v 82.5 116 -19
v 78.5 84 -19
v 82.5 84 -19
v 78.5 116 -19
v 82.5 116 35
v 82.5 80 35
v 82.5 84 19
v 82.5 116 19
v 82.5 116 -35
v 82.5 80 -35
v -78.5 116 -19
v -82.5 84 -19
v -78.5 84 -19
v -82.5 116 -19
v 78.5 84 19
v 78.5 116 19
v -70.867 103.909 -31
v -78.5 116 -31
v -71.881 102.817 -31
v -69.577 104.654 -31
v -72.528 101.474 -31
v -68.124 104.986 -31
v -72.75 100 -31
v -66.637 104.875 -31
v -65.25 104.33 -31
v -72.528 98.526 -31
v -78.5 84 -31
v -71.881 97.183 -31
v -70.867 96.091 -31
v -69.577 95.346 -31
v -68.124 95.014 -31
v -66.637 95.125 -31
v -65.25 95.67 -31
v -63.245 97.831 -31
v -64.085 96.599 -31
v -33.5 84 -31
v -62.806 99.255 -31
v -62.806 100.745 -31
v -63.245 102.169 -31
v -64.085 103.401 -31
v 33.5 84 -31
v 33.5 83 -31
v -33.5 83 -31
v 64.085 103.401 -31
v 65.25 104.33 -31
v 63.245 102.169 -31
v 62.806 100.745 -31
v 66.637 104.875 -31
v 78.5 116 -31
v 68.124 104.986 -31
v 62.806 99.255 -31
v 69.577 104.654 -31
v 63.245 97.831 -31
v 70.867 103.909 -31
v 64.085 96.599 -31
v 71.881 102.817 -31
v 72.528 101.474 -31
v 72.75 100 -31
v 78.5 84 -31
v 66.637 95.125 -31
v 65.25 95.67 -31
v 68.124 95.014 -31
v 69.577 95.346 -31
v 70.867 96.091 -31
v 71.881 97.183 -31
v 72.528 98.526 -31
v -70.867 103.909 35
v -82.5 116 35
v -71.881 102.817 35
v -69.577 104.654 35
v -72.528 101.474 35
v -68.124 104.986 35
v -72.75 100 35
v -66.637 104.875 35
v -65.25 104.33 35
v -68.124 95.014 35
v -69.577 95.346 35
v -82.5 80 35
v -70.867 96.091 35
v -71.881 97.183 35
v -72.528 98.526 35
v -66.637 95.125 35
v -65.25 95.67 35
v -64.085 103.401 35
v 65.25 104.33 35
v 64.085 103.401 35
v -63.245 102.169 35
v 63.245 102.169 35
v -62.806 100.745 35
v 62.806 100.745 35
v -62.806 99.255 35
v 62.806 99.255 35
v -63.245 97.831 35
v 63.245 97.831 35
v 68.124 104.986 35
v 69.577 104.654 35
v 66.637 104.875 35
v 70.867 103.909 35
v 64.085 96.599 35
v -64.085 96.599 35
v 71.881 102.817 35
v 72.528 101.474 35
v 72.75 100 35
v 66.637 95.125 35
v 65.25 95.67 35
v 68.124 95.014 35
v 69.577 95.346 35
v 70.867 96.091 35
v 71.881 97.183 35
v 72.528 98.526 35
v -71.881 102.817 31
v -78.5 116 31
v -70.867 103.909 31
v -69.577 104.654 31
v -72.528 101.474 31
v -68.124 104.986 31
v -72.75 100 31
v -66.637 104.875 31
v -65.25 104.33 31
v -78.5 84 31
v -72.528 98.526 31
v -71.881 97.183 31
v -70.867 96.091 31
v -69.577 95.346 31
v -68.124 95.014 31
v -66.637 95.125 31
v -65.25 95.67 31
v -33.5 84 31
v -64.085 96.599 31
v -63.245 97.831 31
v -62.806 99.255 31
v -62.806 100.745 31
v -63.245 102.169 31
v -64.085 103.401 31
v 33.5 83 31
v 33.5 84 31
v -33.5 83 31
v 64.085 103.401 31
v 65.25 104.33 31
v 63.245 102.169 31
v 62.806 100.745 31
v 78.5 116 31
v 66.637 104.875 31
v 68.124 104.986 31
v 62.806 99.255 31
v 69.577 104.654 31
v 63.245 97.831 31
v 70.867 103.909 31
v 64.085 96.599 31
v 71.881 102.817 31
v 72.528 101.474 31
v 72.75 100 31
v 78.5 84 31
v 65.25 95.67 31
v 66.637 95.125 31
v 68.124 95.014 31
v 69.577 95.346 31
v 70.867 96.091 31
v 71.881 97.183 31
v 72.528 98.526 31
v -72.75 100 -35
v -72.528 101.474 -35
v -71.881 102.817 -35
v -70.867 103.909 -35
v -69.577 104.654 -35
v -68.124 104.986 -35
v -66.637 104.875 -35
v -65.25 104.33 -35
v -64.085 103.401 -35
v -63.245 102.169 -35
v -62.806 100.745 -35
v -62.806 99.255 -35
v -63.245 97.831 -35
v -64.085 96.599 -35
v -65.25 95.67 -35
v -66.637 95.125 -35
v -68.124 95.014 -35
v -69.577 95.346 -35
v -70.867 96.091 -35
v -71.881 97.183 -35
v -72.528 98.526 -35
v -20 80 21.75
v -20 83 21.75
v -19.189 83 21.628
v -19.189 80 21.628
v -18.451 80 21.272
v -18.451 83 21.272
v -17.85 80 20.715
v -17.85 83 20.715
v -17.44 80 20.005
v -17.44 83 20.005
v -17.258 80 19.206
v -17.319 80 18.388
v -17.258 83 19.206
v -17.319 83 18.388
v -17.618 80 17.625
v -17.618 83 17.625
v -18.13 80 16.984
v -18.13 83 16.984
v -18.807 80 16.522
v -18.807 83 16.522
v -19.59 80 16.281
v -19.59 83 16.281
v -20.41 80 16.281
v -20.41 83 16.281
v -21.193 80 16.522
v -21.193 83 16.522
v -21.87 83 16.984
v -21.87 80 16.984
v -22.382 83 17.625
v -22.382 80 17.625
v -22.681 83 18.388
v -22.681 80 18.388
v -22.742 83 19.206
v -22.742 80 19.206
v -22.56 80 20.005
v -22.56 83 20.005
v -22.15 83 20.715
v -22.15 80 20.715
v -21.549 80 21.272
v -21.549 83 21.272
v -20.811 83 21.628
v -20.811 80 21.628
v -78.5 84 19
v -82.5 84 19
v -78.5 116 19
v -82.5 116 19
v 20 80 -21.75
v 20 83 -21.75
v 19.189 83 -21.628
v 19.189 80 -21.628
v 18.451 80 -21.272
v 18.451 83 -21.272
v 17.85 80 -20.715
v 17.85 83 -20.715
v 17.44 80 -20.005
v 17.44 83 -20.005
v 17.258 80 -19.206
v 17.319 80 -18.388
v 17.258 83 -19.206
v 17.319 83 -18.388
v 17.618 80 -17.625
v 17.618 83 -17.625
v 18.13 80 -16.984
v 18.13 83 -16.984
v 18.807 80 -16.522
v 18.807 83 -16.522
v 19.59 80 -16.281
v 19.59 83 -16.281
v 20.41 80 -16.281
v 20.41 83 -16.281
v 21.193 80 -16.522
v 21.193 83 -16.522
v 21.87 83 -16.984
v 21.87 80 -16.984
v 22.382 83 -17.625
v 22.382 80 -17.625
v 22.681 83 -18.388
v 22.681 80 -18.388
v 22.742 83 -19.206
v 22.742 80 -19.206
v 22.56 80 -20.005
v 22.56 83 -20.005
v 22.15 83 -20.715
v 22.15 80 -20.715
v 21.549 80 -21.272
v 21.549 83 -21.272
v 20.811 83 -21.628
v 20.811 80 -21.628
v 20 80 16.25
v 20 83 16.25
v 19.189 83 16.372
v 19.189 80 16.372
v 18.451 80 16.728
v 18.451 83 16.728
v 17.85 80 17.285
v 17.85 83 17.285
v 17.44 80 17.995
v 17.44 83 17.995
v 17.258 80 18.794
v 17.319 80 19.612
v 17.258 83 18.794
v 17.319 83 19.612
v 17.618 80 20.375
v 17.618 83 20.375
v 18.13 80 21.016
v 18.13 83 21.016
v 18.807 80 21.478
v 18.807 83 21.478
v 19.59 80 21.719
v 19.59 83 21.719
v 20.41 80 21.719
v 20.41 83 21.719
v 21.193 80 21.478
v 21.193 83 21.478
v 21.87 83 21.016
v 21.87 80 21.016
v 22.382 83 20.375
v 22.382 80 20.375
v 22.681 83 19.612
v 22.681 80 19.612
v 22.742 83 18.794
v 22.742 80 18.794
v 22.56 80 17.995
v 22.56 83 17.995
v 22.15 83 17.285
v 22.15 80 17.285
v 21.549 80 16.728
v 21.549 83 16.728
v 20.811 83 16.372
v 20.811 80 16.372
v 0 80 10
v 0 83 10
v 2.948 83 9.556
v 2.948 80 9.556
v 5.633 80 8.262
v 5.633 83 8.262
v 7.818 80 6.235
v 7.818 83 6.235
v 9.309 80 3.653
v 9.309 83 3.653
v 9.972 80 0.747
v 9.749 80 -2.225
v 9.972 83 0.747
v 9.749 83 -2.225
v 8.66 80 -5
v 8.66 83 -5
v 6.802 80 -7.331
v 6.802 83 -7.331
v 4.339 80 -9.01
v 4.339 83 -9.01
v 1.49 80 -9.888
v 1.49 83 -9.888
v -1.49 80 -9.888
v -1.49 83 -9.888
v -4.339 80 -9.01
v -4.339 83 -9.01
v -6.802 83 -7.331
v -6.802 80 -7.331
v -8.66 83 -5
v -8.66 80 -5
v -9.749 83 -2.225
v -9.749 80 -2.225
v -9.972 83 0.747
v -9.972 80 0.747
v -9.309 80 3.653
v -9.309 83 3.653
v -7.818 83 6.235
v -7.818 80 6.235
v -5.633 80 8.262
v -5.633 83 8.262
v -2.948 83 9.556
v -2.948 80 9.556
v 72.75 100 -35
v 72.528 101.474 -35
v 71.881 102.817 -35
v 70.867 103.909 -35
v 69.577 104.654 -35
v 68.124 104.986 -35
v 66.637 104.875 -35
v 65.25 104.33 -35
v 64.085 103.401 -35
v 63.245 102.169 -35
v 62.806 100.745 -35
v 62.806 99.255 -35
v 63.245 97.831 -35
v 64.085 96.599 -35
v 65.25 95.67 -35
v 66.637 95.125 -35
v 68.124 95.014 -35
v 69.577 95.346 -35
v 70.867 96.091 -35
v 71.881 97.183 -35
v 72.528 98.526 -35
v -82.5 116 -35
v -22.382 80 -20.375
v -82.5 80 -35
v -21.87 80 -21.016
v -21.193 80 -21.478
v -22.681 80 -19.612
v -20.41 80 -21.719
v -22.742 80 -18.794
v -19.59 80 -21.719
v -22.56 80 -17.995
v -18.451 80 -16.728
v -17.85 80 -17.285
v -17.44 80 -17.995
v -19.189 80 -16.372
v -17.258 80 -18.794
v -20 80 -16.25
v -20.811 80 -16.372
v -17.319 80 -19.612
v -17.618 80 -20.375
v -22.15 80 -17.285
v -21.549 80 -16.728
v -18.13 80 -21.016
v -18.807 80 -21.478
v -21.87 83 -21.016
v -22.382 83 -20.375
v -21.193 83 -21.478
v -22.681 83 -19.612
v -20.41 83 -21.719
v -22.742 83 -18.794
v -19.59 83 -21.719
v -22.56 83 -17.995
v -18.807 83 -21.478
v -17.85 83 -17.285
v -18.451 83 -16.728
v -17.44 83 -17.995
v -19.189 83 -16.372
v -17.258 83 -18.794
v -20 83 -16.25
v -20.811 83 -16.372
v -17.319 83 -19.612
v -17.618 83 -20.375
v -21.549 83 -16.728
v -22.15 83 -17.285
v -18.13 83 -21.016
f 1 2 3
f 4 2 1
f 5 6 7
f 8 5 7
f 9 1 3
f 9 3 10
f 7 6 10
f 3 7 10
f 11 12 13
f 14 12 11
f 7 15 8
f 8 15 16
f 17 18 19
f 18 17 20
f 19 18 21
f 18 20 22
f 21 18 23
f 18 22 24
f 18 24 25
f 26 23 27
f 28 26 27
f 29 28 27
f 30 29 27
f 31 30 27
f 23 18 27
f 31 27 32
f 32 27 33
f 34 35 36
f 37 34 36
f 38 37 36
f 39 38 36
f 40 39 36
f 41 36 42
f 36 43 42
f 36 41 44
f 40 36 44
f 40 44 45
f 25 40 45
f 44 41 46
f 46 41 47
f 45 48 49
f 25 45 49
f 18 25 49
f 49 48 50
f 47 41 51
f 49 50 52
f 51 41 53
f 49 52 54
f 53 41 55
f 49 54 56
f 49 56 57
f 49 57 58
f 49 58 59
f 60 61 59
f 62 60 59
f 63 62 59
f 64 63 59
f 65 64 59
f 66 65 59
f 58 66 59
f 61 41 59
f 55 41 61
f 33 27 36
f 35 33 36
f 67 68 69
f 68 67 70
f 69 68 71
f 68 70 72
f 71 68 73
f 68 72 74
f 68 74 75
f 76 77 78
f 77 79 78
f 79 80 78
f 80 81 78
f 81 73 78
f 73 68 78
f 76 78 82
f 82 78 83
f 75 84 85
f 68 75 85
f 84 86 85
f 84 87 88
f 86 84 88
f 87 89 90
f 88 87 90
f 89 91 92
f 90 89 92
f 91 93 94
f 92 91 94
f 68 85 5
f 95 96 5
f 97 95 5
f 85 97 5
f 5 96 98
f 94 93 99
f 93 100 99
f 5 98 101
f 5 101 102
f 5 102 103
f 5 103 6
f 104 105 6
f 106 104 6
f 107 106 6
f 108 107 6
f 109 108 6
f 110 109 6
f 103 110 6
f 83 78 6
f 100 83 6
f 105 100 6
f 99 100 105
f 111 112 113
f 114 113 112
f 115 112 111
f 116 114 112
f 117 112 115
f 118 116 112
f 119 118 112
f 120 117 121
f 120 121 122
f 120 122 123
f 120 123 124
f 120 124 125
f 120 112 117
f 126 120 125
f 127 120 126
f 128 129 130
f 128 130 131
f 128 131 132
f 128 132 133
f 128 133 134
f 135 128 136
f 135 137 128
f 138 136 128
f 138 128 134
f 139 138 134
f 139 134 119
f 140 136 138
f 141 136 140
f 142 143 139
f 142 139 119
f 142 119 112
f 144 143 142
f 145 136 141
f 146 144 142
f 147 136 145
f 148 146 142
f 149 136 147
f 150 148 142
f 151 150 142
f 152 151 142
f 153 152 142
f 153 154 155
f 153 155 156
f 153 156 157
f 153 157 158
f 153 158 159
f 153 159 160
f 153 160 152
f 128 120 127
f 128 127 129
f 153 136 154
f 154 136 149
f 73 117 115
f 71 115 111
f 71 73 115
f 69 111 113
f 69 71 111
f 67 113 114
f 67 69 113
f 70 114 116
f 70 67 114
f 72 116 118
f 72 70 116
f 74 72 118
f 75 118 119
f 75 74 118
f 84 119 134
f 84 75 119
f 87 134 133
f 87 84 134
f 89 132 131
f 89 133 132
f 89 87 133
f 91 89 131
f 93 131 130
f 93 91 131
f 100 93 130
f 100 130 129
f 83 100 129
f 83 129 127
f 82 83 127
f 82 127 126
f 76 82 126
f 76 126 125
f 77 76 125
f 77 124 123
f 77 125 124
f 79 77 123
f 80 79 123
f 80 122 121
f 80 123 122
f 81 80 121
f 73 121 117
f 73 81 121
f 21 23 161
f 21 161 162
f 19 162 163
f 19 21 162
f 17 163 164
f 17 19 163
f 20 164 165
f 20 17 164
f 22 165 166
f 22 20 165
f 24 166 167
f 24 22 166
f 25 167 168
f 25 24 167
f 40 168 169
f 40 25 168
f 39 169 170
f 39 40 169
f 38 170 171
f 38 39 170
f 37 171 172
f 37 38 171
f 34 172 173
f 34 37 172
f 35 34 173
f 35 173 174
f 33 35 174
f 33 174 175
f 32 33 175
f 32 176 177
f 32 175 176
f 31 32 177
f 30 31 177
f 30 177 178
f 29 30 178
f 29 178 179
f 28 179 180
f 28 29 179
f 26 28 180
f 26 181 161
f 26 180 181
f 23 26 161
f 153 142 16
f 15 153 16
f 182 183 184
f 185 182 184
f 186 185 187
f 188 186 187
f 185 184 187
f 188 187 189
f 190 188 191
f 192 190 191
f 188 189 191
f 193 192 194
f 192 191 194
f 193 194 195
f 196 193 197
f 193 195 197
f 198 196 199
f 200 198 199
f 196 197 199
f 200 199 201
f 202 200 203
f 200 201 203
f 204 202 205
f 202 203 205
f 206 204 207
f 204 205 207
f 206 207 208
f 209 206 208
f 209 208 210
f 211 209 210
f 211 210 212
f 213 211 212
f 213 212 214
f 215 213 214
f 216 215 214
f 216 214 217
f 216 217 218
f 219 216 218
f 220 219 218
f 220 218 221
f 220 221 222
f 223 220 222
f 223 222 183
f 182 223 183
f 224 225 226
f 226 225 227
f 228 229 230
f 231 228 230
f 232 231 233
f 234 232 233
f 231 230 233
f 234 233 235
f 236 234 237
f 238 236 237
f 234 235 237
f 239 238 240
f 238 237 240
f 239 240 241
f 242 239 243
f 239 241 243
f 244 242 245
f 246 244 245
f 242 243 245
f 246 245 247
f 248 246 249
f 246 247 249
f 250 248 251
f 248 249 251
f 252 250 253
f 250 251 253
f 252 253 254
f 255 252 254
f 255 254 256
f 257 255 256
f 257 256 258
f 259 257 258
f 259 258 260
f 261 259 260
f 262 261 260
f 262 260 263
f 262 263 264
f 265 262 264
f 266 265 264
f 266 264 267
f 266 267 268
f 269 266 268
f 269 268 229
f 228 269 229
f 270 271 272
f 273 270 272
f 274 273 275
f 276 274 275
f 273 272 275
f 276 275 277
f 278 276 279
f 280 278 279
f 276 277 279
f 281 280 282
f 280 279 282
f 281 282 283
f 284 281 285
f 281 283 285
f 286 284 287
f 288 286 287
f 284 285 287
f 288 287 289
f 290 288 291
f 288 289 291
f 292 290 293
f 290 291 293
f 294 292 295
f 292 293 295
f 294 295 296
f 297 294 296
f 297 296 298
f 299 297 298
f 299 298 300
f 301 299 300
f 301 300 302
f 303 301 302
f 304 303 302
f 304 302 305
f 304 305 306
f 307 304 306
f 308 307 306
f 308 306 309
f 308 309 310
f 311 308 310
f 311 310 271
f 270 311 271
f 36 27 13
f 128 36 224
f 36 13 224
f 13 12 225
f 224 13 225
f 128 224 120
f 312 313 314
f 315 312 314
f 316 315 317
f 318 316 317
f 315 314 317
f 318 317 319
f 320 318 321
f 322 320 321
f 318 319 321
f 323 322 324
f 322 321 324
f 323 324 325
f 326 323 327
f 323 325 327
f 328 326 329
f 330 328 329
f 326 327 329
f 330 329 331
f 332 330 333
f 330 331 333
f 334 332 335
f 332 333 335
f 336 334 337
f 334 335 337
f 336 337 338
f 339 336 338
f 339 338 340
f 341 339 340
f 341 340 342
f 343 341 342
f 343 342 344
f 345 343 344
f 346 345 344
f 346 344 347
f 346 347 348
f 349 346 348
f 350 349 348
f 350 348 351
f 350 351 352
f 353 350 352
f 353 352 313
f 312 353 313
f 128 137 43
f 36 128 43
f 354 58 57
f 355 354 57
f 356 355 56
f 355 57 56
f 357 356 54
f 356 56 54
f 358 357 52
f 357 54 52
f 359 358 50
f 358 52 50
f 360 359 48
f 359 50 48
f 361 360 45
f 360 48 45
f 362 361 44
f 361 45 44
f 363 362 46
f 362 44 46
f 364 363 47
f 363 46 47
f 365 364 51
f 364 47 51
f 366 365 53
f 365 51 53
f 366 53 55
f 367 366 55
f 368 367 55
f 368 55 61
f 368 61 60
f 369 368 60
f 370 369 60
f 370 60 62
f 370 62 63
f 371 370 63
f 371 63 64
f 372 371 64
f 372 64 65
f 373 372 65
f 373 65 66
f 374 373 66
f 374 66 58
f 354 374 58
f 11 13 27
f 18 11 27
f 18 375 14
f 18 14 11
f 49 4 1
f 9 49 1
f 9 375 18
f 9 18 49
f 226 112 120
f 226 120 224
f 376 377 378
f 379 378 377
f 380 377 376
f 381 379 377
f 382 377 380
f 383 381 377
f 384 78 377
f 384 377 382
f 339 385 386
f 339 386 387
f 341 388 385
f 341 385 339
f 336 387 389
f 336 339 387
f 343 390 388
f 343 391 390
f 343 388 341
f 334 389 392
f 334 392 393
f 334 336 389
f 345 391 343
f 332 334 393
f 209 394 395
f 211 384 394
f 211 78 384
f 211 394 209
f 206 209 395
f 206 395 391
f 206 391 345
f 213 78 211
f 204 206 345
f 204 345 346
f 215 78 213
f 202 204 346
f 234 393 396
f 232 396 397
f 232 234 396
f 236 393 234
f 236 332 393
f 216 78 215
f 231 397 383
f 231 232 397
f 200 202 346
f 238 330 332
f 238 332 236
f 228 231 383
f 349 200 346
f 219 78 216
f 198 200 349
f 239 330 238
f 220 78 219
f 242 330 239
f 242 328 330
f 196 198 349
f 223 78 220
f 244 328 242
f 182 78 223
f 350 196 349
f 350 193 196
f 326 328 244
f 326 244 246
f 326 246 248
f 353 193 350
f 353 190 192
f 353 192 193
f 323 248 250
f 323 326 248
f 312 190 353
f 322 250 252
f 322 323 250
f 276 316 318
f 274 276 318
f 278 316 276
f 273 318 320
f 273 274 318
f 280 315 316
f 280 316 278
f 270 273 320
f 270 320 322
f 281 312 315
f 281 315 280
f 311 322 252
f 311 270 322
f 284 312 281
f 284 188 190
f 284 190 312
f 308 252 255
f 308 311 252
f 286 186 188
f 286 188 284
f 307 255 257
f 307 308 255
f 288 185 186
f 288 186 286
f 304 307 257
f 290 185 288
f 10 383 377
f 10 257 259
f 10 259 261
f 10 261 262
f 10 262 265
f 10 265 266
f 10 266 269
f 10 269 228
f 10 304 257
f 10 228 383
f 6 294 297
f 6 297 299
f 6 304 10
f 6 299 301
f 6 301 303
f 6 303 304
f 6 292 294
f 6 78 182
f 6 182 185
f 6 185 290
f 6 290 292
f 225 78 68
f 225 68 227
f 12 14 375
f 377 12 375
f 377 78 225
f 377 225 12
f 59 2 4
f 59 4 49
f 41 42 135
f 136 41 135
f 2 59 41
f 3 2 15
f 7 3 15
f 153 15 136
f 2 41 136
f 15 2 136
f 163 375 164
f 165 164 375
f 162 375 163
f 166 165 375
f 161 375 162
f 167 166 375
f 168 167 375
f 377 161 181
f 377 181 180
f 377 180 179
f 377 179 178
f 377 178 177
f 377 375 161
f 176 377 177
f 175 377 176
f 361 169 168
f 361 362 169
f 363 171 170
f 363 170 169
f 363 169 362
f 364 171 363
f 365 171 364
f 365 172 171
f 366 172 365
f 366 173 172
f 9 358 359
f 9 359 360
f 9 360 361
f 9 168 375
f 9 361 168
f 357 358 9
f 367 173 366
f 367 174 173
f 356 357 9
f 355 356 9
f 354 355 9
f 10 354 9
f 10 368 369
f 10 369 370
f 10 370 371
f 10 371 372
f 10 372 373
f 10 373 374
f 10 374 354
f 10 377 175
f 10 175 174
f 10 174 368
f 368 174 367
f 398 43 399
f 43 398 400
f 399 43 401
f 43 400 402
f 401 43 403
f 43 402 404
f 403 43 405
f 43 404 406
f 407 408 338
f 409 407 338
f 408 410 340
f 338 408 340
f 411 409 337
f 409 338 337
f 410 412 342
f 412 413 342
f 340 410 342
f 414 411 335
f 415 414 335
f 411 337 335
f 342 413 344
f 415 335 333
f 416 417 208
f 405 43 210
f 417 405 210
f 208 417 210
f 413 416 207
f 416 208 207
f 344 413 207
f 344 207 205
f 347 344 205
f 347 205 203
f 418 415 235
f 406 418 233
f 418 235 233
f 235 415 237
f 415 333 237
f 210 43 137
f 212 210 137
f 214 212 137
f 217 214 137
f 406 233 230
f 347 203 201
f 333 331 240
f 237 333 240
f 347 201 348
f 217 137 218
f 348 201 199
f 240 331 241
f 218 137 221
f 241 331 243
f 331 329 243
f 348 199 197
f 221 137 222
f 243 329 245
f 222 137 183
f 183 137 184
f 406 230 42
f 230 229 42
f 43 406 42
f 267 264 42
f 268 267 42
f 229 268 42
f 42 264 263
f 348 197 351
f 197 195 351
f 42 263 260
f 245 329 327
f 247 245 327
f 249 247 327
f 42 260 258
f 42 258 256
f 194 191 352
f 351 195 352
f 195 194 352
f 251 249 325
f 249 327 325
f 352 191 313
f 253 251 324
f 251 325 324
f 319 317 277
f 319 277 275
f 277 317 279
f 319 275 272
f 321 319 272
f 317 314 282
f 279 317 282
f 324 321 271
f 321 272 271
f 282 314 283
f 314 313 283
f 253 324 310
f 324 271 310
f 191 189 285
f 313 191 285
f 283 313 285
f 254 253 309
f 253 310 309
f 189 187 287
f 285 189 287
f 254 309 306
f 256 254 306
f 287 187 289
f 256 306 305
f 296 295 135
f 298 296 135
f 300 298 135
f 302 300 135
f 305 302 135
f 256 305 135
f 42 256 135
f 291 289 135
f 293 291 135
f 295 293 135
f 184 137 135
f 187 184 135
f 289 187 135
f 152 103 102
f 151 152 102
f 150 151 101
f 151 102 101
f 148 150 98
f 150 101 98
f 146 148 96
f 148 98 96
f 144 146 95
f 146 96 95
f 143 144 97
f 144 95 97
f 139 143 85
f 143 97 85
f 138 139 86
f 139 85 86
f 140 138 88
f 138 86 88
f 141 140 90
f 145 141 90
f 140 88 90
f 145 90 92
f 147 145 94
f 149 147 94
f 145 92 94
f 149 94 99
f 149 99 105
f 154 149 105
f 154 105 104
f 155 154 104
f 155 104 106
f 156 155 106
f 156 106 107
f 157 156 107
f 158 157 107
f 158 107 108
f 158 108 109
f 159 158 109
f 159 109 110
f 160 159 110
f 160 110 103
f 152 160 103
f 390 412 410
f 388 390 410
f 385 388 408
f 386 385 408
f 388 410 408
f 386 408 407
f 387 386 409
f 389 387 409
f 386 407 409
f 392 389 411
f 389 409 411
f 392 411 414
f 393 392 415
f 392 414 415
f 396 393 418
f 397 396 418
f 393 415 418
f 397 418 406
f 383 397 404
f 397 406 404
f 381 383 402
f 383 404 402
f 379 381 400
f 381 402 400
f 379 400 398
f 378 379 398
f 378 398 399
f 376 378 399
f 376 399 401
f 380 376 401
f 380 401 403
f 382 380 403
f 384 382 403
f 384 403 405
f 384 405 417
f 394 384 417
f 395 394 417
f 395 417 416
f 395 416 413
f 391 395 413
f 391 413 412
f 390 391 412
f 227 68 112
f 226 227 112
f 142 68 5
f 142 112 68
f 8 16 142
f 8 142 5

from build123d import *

# Parameters (mm, degrees)
SKETCH1_W                 = 75
SKETCH1_H                 = 40
SKETCH1_R                 = 5
SKETCH1_R_2               = 1.7
SKETCH1_W_2               = 10
SKETCH1_H_2               = 20
BOSS_EXTRUDE1_DEPTH       = 3
CUT_EXTRUDE1_DEPTH        = 43.605750786
CUT_EXTRUDE1_DEPTH_BACK   = 43.605750786
SKETCH2_W                 = 67
SKETCH2_H                 = 28
BOSS_EXTRUDE3_DEPTH       = 110
BOSS_EXTRUDE3_DEPTH_BACK  = 3
SKETCH6_W                 = 67
SKETCH6_H                 = 11
CUT_EXTRUDE4_DEPTH        = 122.372360939
SKETCH7_W                 = 70
SKETCH7_H                 = 37
BOSS_EXTRUDE4_DEPTH       = 45
SKETCH8_W                 = 45
SKETCH8_H                 = 62
CUT_EXTRUDE6_DEPTH        = 29
SKETCH11_W                = 45
SKETCH11_H                = 4
CUT_EXTRUDE9_DEPTH        = 157.445677473
SKETCH9_W                 = 38
SKETCH9_H                 = 28.5
CUT_EXTRUDE10_DEPTH       = 204.024629048
SKETCH13_W                = 5
SKETCH13_H                = 38
BOSS_EXTRUDE5_DEPTH       = 32
SKETCH14_R                = 5
SKETCH14_R_2              = 1.7
CUT_EXTRUDE11_DEPTH       = 32
SKETCH15_W                = 165
SKETCH15_H                = 70
SKETCH15_W_2              = 157
SKETCH15_H_2              = 62
BOSS_EXTRUDE6_DEPTH       = 3
SKETCH16_W                = 20
SKETCH16_H                = 4.820648258
CUT_EXTRUDE12_DEPTH       = 159.626132778
SKETCH18_R                = 5
CUT_EXTRUDE14_DEPTH       = 159.626132778
MIRROR6_COPY_1_SKETCH_W   = 5
MIRROR6_COPY_1_SKETCH_H   = 38
MIRROR6_COPY_1_DEPTH      = 32
MIRROR6_COPY_2_SKETCH_R   = 5
MIRROR6_COPY_2_SKETCH_R_2 = 1.7
MIRROR6_COPY_2_DEPTH      = 32
SKETCH19_W                = 38
SKETCH19_H                = 3.5
CUT_EXTRUDE15_DEPTH       = 10
SKETCH20_R                = 1.2
CUT_EXTRUDE16_DEPTH       = 10
SKETCH21_W                = 10
SKETCH21_H                = 80
CUT_EXTRUDE17_DEPTH       = 184.330984833
SKETCH22_W                = 55
SKETCH22_H                = 80
CUT_EXTRUDE18_DEPTH       = 184.330984833
SKETCH23_W                = 67
SKETCH23_H                = 62
BOSS_EXTRUDE7_DEPTH       = 3
SKETCH24_R                = 10
SKETCH24_R_2              = 2.75
CUT_EXTRUDE19_DEPTH       = 111.707949127
SKETCH25_W                = 38
SKETCH25_H                = 64
CUT_EXTRUDE20_DEPTH       = 115


with BuildPart() as part:
    # Sketch1 → Boss-Extrude1 (new body)
    with BuildSketch(Plane(origin=(0, 0, 0), x_dir=(1, 0, 0), z_dir=(0, 1, 0))):
        Rectangle(SKETCH1_W, SKETCH1_H)
        with Locations(Location((-21, 0, 0), (0, 0, 270))):
            Circle(SKETCH1_R, mode=Mode.SUBTRACT)
        with Locations(Location((-30, 8.25, 0), (0, 0, 270))):
            Circle(SKETCH1_R_2, mode=Mode.SUBTRACT)
        with Locations(Location((-12, 8.25, 0), (0, 0, 270))):
            Circle(SKETCH1_R_2, mode=Mode.SUBTRACT)
        with Locations(Location((-12, -8.25, 0), (0, 0, 270))):
            Circle(SKETCH1_R_2, mode=Mode.SUBTRACT)
        with Locations(Location((-30, -8.25, 0), (0, 0, 270))):
            Circle(SKETCH1_R_2, mode=Mode.SUBTRACT)
        with Locations(Location((12, 8.25, 0), (0, 0, 90))):
            Circle(SKETCH1_R_2, mode=Mode.SUBTRACT)
        with Locations(Location((12, -8.25, 0), (0, 0, 90))):
            Circle(SKETCH1_R_2, mode=Mode.SUBTRACT)
        with Locations(Location((21, 0, 0), (0, 0, 90))):
            Circle(SKETCH1_R, mode=Mode.SUBTRACT)
        with Locations(Location((30, -8.25, 0), (0, 0, 90))):
            Circle(SKETCH1_R_2, mode=Mode.SUBTRACT)
        with Locations(Location((30, 8.25, 0), (0, 0, 90))):
            Circle(SKETCH1_R_2, mode=Mode.SUBTRACT)
        Rectangle(SKETCH1_W_2, SKETCH1_H_2, mode=Mode.SUBTRACT)
    extrude(amount=BOSS_EXTRUDE1_DEPTH)

    # Sketch2 → Cut-Extrude1 (cut, two sides: drawn at the far end of the back side and taken through both)
    with BuildSketch(Plane(origin=(0, 3, 0), x_dir=(1, 0, 0), z_dir=(0, 1, 0)).offset(-CUT_EXTRUDE1_DEPTH_BACK)):
        Rectangle(SKETCH2_W, SKETCH2_H)
    extrude(amount=CUT_EXTRUDE1_DEPTH + CUT_EXTRUDE1_DEPTH_BACK, mode=Mode.SUBTRACT)

    # Sketch3 → Boss-Extrude3 (add, two sides: drawn at the far end of the back side and taken through both)
    with BuildSketch(Plane(origin=(0, 3, 0), x_dir=(1, 0, 0), z_dir=(0, 1, 0)).offset(-BOSS_EXTRUDE3_DEPTH_BACK)):
        Polygon((37.5, -35), (37.5, -20), (33.5, -20), (-33.5, -20), (-37.5, -20), (-37.5, -35), align=None)
        Polygon((33.5, 20), (37.5, 20), (37.5, 35), (-37.5, 35), (-37.5, 20), (-33.5, 20), align=None)
        Polygon((37.5, -20), (37.5, 20), (33.5, 20), (33.5, 14), (33.5, -14), (33.5, -20), align=None)
        Polygon((-33.5, 14), (-33.5, 20), (-37.5, 20), (-37.5, -20), (-33.5, -20), (-33.5, -14), align=None)
    extrude(amount=BOSS_EXTRUDE3_DEPTH + BOSS_EXTRUDE3_DEPTH_BACK)

    # Sketch6 → Cut-Extrude4 (cut, through all)
    with BuildSketch(Plane(origin=(0, 3, 0), x_dir=(1, 0, 0), z_dir=(0, 1, 0))):
        with Locations((0, -25.5)):
            Rectangle(SKETCH6_W, SKETCH6_H)
        with Locations((0, 25.5)):
            Rectangle(SKETCH6_W, SKETCH6_H)
    extrude(amount=CUT_EXTRUDE4_DEPTH, mode=Mode.SUBTRACT)

    # Sketch7 → Boss-Extrude4 (add)
    with BuildSketch(Plane.ZY.offset(37.5)):
        with Locations((0, 94.5)):
            Rectangle(SKETCH7_W, SKETCH7_H)
    boss_extrude4 = extrude(amount=BOSS_EXTRUDE4_DEPTH)

    # Mirror2: Boss-Extrude4 across plane
    add(boss_extrude4.mirror(Plane(origin=(0, 0, 0), x_dir=(0, 0, 1), z_dir=(1, 0, 0))))

    # Sketch8 → Cut-Extrude6 (cut)
    with BuildSketch(Plane(origin=(0, 113, 0), x_dir=(1, 0, 0), z_dir=(0, 1, 0))):
        with Locations((-56, 0)):
            Rectangle(SKETCH8_W, SKETCH8_H)
        with Locations((56, 0)):
            Rectangle(SKETCH8_W, SKETCH8_H)
    extrude(amount=-CUT_EXTRUDE6_DEPTH, mode=Mode.SUBTRACT)

    # Sketch11 → Cut-Extrude9 (cut, through all)
    with BuildSketch(Plane.XY.offset(35)):
        with Locations((-60, 78)):
            Rectangle(SKETCH11_W, SKETCH11_H)
        with Locations((60, 78)):
            Rectangle(SKETCH11_W, SKETCH11_H)
    extrude(amount=-CUT_EXTRUDE9_DEPTH, mode=Mode.SUBTRACT)

    # Sketch9 → Cut-Extrude10 (cut, through all)
    with BuildSketch(Plane.ZY.offset(82.5)):
        with Locations((0, 98.25)):
            Rectangle(SKETCH9_W, SKETCH9_H)
    extrude(amount=-CUT_EXTRUDE10_DEPTH, mode=Mode.SUBTRACT)

    # Sketch13 → Boss-Extrude5 (add)
    with BuildSketch(Plane(origin=(0, 84, 0), x_dir=(1, 0, 0), z_dir=(0, 1, 0))):
        with Locations((-54.5, 0)):
            Rectangle(SKETCH13_W, SKETCH13_H)
    boss_extrude5 = extrude(amount=BOSS_EXTRUDE5_DEPTH)

    # Sketch14 → Cut-Extrude11 (cut)
    with BuildSketch(Plane.ZY.offset(57)):
        with Locations((0, 98.25)):
            Circle(SKETCH14_R)
        with Locations((-9, 106.5)):
            Circle(SKETCH14_R_2)
        with Locations((9, 106.5)):
            Circle(SKETCH14_R_2)
        with Locations((9, 90)):
            Circle(SKETCH14_R_2)
        with Locations((-9, 90)):
            Circle(SKETCH14_R_2)
    cut_extrude11 = extrude(amount=-CUT_EXTRUDE11_DEPTH, mode=Mode.SUBTRACT)

    # Mirror4: Boss-Extrude5, Cut-Extrude11 across plane
    add(boss_extrude5.mirror(Plane(origin=(0, 0, 0), x_dir=(0, 0, 1), z_dir=(1, 0, 0))))
    add(cut_extrude11.mirror(Plane(origin=(0, 0, 0), x_dir=(0, 0, 1), z_dir=(1, 0, 0))), mode=Mode.SUBTRACT)

    # Sketch15 → Boss-Extrude6 (add)
    with BuildSketch(Plane(origin=(0, 113, 0), x_dir=(1, 0, 0), z_dir=(0, 1, 0))):
        Rectangle(SKETCH15_W, SKETCH15_H)
        Rectangle(SKETCH15_W_2, SKETCH15_H_2, mode=Mode.SUBTRACT)
    extrude(amount=BOSS_EXTRUDE6_DEPTH)

    # Sketch16 → Cut-Extrude12 (cut, through all)
    with BuildSketch(Plane.XY.offset(35)):
        with Locations((0, 11.636111214)):
            Rectangle(SKETCH16_W, SKETCH16_H)
    extrude(amount=-CUT_EXTRUDE12_DEPTH, mode=Mode.SUBTRACT)

    # Sketch18 → Cut-Extrude14 (cut, through all)
    with BuildSketch(Plane.XY.offset(35)):
        with Locations((67.75, 100)):
            Circle(SKETCH18_R)
    cut_extrude14 = extrude(amount=-CUT_EXTRUDE14_DEPTH, mode=Mode.SUBTRACT)

    # Mirror5: Cut-Extrude14 across plane
    add(cut_extrude14.mirror(Plane(origin=(0, 0, 0), x_dir=(0, 0, 1), z_dir=(1, 0, 0))), mode=Mode.SUBTRACT)

    # Mirror6: Boss-Extrude5, Cut-Extrude11 across plane
    add(boss_extrude5.mirror(Plane.ZX.offset(116)))
    add(cut_extrude11.mirror(Plane.ZX.offset(116)), mode=Mode.SUBTRACT)

    # Mirror6 copy 1 sketch → Mirror6 copy 1 (add)
    with BuildSketch(Plane(origin=(0, 148, 0), x_dir=(-1, 0, 0), z_dir=(0, -1, 0))):
        with Locations((-54.5, 0)):
            Rectangle(MIRROR6_COPY_1_SKETCH_W, MIRROR6_COPY_1_SKETCH_H)
    extrude(amount=MIRROR6_COPY_1_DEPTH)

    # Mirror6 copy 2 sketch → Mirror6 copy 2 (cut)
    with BuildSketch(Plane(origin=(57, 232, 0), x_dir=(0, 0, 1), z_dir=(1, 0, 0))):
        with Locations((0, 98.25)):
            Circle(MIRROR6_COPY_2_SKETCH_R)
        with Locations((-9, 106.5)):
            Circle(MIRROR6_COPY_2_SKETCH_R_2)
        with Locations((9, 106.5)):
            Circle(MIRROR6_COPY_2_SKETCH_R_2)
        with Locations((9, 90)):
            Circle(MIRROR6_COPY_2_SKETCH_R_2)
        with Locations((-9, 90)):
            Circle(MIRROR6_COPY_2_SKETCH_R_2)
    extrude(amount=-MIRROR6_COPY_2_DEPTH, mode=Mode.SUBTRACT)

    # Sketch19 → Cut-Extrude15 (cut)
    with BuildSketch(Plane(origin=(82.5, 0, 0), x_dir=(0, 0, -1), z_dir=(1, 0, 0))):
        with Locations((0, 114.25)):
            Rectangle(SKETCH19_W, SKETCH19_H)
    cut_extrude15 = extrude(amount=-CUT_EXTRUDE15_DEPTH, mode=Mode.SUBTRACT)

    # Mirror7: Cut-Extrude15 across plane
    add(cut_extrude15.mirror(Plane(origin=(0, 0, 0), x_dir=(0, 0, 1), z_dir=(1, 0, 0))), mode=Mode.SUBTRACT)

    # Sketch20 → Cut-Extrude16 (cut)
    with BuildSketch(Plane(origin=(0, 3, 0), x_dir=(1, 0, 0), z_dir=(0, 1, 0))):
        with Locations(Location((-24, 17.5, 0), (0, 0, 270))):
            Circle(SKETCH20_R)
        with Locations(Location((-12, 17.5, 0), (0, 0, 270))):
            Circle(SKETCH20_R)
        with Locations(Location((12, 17.5, 0), (0, 0, 270))):
            Circle(SKETCH20_R)
        with Locations(Location((-24, -17.5, 0), (0, 0, 270))):
            Circle(SKETCH20_R)
        with Locations(Location((-12, -17.5, 0), (0, 0, 270))):
            Circle(SKETCH20_R)
        with Locations(Location((24, 17.5, 0), (0, 0, 270))):
            Circle(SKETCH20_R)
        with Locations(Location((12, -17.5, 0), (0, 0, 270))):
            Circle(SKETCH20_R)
        with Locations(Location((24, -17.5, 0), (0, 0, 270))):
            Circle(SKETCH20_R)
    extrude(amount=-CUT_EXTRUDE16_DEPTH, mode=Mode.SUBTRACT)

    # Sketch21 → Cut-Extrude17 (cut, through all)
    with BuildSketch(Plane.XY.offset(35)):
        with Locations((32.5, 40)):
            Rectangle(SKETCH21_W, SKETCH21_H)
        with Locations((-32.5, 40)):
            Rectangle(SKETCH21_W, SKETCH21_H)
    extrude(amount=-CUT_EXTRUDE17_DEPTH, mode=Mode.SUBTRACT)

    # Sketch22 → Cut-Extrude18 (cut, through all)
    with BuildSketch(Plane.XY.offset(35)):
        with Locations((0, 40)):
            Rectangle(SKETCH22_W, SKETCH22_H)
    extrude(amount=-CUT_EXTRUDE18_DEPTH, mode=Mode.SUBTRACT)

    # Sketch23 → Boss-Extrude7 (add)
    with BuildSketch(Plane.XZ.offset(-80)):
        Rectangle(SKETCH23_W, SKETCH23_H)
    extrude(amount=-BOSS_EXTRUDE7_DEPTH)

    # Sketch24 → Cut-Extrude19 (cut, through all)
    with BuildSketch(Plane(origin=(0, 83, 0), x_dir=(1, 0, 0), z_dir=(0, 1, 0))):
        with Locations(Location((0, 0, 0), (0, 0, 270))):
            Circle(SKETCH24_R)
        with Locations(Location((-20, 19, 0), (0, 0, 270))):
            Circle(SKETCH24_R_2)
        with Locations(Location((-20, -19, 0), (0, 0, 270))):
            Circle(SKETCH24_R_2)
        with Locations(Location((20, -19, 0), (0, 0, 90))):
            Circle(SKETCH24_R_2)
        with Locations(Location((20, 19, 0), (0, 0, 90))):
            Circle(SKETCH24_R_2)
    extrude(amount=-CUT_EXTRUDE19_DEPTH, mode=Mode.SUBTRACT)

    # Sketch25 → Cut-Extrude20 (cut)
    with BuildSketch(Plane(origin=(57, 0, 0), x_dir=(0, 0, -1), z_dir=(1, 0, 0))):
        with Locations((0, 116)):
            Rectangle(SKETCH25_W, SKETCH25_H)
    extrude(amount=-CUT_EXTRUDE20_DEPTH, mode=Mode.SUBTRACT)


solid = part.part
